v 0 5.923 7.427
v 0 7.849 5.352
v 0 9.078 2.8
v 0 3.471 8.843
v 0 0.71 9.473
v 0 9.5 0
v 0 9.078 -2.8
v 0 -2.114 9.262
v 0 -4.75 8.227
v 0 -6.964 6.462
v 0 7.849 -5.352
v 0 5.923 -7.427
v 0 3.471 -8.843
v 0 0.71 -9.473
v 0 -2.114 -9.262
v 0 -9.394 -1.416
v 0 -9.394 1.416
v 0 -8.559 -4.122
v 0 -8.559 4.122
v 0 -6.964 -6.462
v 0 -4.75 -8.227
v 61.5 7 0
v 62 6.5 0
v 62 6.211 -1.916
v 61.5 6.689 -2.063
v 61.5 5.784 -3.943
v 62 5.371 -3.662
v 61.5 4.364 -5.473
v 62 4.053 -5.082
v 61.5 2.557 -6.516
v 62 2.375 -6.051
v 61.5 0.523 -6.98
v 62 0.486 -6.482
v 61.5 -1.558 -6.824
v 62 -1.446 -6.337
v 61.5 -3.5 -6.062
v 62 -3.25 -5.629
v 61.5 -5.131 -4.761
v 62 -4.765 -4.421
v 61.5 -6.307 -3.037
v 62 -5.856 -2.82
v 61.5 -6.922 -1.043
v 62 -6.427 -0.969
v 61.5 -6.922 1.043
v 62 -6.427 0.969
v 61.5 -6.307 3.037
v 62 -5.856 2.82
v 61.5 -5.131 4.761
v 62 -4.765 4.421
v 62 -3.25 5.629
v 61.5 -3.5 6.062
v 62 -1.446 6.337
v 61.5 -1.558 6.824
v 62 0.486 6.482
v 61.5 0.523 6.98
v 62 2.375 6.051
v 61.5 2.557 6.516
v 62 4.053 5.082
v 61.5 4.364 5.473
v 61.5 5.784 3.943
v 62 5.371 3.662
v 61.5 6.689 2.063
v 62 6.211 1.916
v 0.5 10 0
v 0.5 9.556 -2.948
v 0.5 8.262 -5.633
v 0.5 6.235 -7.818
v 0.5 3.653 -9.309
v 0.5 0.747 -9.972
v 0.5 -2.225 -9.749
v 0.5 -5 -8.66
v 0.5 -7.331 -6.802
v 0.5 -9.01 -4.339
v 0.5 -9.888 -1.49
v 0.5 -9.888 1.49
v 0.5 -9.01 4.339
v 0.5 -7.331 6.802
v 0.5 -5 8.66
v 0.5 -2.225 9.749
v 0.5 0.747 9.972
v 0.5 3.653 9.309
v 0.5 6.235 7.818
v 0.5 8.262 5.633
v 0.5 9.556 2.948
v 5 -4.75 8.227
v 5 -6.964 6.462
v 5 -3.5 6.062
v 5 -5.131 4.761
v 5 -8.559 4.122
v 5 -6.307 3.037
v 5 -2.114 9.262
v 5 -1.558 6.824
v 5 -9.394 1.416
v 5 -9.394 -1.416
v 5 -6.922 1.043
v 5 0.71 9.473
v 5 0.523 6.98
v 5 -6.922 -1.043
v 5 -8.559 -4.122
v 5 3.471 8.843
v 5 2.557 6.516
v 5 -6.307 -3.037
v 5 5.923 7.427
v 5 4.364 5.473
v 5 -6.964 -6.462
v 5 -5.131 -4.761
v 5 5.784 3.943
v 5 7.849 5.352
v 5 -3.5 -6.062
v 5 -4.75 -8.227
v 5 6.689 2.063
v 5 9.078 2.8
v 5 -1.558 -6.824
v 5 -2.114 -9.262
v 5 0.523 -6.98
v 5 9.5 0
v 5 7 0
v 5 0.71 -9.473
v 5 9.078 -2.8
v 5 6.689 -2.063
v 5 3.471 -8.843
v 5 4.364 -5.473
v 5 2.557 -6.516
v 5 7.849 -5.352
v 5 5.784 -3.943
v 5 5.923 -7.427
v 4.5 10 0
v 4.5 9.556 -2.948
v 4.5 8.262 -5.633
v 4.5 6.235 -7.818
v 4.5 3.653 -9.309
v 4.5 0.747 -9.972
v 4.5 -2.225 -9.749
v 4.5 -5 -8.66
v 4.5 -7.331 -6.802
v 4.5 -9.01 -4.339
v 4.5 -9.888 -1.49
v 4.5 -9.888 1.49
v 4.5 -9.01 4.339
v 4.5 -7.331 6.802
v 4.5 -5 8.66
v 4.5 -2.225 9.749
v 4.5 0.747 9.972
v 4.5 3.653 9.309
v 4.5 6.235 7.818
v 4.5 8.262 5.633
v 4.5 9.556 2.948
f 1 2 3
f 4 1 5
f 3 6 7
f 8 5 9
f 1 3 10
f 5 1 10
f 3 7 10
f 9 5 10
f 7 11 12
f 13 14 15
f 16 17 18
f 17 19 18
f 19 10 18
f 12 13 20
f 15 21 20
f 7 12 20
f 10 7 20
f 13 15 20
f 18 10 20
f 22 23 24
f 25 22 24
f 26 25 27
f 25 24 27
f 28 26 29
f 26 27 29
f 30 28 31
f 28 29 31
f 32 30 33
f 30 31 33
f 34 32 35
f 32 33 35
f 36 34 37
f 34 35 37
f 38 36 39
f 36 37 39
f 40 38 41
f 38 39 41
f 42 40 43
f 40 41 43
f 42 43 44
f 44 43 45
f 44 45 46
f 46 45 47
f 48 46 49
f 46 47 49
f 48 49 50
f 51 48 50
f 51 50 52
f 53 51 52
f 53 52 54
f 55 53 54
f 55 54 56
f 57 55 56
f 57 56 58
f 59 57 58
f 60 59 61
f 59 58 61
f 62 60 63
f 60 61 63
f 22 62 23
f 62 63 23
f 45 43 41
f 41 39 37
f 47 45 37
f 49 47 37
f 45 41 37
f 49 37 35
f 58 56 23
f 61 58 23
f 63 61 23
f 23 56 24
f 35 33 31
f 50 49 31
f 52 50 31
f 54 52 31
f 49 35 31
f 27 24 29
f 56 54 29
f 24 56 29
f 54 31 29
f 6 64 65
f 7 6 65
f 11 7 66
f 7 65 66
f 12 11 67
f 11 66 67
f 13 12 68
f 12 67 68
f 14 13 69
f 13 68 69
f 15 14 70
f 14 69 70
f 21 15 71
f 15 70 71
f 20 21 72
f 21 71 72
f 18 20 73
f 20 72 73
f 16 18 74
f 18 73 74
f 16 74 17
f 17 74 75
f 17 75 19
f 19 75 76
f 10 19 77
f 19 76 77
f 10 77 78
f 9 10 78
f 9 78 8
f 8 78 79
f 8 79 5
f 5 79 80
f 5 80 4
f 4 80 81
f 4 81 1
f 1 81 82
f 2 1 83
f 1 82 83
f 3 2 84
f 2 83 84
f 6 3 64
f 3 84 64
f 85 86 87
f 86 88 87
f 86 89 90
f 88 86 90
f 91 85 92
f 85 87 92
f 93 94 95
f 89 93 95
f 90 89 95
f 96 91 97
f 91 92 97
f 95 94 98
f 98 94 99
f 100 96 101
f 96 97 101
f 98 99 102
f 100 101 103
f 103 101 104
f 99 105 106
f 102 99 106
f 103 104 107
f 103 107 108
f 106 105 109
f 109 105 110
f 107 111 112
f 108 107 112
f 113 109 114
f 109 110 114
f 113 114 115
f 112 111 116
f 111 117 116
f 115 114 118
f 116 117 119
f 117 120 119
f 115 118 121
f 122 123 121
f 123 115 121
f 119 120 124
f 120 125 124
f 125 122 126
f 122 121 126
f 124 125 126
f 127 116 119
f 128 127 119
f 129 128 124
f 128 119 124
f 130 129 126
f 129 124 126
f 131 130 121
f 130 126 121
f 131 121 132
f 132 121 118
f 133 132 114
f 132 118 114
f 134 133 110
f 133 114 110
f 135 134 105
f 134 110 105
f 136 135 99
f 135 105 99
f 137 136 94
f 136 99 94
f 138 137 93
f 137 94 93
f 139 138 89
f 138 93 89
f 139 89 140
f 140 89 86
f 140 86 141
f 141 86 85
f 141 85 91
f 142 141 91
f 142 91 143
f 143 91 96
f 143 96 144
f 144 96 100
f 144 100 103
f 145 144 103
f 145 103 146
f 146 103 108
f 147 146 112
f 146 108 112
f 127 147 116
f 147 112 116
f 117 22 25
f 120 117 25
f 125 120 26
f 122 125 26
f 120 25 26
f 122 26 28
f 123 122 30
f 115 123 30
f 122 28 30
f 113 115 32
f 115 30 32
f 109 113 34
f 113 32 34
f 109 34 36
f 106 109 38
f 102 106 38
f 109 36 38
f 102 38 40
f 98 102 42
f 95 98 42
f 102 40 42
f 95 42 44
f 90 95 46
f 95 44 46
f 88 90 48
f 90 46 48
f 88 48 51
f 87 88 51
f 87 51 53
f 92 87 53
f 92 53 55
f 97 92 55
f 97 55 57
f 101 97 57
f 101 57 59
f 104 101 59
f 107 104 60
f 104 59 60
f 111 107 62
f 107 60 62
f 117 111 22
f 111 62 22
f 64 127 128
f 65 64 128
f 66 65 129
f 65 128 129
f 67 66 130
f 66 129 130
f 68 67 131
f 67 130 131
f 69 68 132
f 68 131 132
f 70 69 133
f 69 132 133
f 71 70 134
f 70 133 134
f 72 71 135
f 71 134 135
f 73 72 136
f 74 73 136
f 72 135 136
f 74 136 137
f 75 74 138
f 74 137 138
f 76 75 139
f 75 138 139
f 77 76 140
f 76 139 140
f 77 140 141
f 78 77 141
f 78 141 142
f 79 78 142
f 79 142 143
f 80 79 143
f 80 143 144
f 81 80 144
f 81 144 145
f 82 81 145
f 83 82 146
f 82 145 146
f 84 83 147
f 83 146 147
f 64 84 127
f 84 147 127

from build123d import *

# Parameters (mm, degrees)
SFAZOWANIE1_SIZE = 0.5


with BuildPart() as part:
    # Szkic1 → Obrót1 (revolve)
    with BuildSketch(Plane.XY):
        Polygon((0, 0), (0, 10), (5, 10), (5, 7), (62, 7), (62, 0), align=None)
    revolve(axis=Axis((62, 0, 0), (-1, 0, 0)))

    # Sfazowanie1
    sfazowanie1_edges = [part.edges().sort_by_distance(p)[0] for p in [
        (62, -7, 0),
        (5, -10, 0),
        (0, -10, 0),
    ]]
    chamfer(sfazowanie1_edges, length=SFAZOWANIE1_SIZE)


solid = part.part
